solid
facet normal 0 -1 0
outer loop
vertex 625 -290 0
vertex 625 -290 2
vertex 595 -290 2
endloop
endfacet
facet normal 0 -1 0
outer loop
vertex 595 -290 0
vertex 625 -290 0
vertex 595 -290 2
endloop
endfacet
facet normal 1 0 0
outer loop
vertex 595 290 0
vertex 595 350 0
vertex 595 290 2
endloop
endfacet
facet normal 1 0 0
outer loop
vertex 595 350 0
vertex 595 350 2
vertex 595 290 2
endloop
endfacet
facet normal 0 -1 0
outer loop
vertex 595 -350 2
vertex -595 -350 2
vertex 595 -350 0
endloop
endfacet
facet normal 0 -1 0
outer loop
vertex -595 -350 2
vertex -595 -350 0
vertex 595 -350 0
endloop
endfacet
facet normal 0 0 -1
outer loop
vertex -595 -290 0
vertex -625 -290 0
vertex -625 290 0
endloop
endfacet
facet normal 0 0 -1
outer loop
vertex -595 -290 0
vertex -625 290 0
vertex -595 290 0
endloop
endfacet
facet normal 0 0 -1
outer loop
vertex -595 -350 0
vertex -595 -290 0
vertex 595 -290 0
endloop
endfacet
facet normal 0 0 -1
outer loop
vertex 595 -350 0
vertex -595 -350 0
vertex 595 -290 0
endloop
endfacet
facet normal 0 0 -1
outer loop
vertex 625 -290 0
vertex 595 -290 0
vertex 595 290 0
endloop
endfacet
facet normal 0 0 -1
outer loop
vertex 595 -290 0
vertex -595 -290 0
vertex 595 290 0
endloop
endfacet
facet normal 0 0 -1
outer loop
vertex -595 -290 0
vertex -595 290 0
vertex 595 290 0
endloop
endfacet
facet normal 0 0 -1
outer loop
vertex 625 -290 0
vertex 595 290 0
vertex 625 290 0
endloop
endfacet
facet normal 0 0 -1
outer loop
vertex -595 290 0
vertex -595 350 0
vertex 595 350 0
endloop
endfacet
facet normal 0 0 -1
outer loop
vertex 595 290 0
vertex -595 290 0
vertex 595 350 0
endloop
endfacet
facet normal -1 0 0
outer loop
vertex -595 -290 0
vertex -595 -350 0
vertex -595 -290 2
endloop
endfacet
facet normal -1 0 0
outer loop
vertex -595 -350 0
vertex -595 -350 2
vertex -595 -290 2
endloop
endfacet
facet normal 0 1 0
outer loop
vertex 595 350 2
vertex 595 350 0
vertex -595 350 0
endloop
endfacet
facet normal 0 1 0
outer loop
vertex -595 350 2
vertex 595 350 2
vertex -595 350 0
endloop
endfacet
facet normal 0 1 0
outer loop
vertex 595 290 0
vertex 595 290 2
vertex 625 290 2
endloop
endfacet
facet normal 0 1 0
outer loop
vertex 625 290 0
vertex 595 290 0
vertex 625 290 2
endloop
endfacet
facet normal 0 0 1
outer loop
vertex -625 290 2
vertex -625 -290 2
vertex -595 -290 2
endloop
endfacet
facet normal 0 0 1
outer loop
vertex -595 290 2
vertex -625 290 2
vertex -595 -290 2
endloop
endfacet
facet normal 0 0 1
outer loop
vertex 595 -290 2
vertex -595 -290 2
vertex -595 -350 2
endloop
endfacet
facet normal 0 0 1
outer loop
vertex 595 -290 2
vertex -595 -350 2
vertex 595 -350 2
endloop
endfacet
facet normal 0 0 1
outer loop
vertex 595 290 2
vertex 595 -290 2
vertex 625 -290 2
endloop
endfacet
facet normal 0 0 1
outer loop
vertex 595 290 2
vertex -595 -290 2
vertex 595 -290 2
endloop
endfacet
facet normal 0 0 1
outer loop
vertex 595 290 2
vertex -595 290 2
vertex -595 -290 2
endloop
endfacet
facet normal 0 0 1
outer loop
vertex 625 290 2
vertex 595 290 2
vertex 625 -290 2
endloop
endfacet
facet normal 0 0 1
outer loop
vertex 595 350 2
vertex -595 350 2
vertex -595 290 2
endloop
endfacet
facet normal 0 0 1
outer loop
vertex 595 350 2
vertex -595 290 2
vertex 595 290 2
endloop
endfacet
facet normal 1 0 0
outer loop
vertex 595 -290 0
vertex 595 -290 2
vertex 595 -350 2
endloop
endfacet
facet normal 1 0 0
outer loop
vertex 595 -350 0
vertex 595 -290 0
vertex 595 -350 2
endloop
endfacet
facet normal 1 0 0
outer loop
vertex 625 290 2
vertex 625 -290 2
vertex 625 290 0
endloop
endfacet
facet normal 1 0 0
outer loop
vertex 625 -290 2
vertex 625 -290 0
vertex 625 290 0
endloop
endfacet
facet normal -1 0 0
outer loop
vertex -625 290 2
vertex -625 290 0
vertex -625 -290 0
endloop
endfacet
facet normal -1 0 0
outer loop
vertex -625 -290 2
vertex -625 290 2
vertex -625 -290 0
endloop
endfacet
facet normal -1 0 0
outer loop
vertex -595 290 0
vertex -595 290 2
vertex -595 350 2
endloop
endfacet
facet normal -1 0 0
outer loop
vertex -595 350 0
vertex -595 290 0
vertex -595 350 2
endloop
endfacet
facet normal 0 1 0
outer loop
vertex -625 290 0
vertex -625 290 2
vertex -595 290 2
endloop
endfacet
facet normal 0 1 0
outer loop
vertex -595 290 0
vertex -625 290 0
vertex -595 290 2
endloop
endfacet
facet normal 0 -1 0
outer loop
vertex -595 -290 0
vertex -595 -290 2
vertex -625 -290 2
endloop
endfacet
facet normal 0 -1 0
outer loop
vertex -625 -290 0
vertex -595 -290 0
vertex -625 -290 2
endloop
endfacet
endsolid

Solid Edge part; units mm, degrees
sketch "Sketch1" plane through (0, 0, 0) normal (0, 0, 1) x (1, 0, 0)
  line L0 (-625, -350) -> (625, -350)
  line L1 (625, -350) -> (625, 350)
  line L2 (625, 350) -> (-625, 350)
  line L3 (-625, 350) -> (-625, -350)
extrude "Protrusion1" add sketch "Sketch1" along normal blind 2
sketch "Sketch2" plane through (0, 0, 2) normal (0, 0, 1) x (0, 1, 0)
  line L0 (290, 595) -> (350, 595)
  line L1 (350, 595) -> (350, 625)
  line L2 (350, 625) -> (290, 625)
  line L3 (290, 625) -> (290, 595)
  line L4 (-350, 595) -> (-290, 595)
  line L5 (-290, 595) -> (-290, 625)
  line L6 (-290, 625) -> (-350, 625)
  line L7 (-350, 625) -> (-350, 595)
  line L8 (290, -595) -> (290, -625)
  line L9 (290, -625) -> (350, -625)
  line L10 (350, -625) -> (350, -595)
  line L11 (350, -595) -> (290, -595)
  line L12 (-290, -625) -> (-290, -595)
  line L13 (-290, -595) -> (-350, -595)
  line L14 (-350, -595) -> (-350, -625)
  line L15 (-350, -625) -> (-290, -625)
extrude "ExtrudedCutout_1" cut sketch "Sketch2" against normal blind 725.2421
